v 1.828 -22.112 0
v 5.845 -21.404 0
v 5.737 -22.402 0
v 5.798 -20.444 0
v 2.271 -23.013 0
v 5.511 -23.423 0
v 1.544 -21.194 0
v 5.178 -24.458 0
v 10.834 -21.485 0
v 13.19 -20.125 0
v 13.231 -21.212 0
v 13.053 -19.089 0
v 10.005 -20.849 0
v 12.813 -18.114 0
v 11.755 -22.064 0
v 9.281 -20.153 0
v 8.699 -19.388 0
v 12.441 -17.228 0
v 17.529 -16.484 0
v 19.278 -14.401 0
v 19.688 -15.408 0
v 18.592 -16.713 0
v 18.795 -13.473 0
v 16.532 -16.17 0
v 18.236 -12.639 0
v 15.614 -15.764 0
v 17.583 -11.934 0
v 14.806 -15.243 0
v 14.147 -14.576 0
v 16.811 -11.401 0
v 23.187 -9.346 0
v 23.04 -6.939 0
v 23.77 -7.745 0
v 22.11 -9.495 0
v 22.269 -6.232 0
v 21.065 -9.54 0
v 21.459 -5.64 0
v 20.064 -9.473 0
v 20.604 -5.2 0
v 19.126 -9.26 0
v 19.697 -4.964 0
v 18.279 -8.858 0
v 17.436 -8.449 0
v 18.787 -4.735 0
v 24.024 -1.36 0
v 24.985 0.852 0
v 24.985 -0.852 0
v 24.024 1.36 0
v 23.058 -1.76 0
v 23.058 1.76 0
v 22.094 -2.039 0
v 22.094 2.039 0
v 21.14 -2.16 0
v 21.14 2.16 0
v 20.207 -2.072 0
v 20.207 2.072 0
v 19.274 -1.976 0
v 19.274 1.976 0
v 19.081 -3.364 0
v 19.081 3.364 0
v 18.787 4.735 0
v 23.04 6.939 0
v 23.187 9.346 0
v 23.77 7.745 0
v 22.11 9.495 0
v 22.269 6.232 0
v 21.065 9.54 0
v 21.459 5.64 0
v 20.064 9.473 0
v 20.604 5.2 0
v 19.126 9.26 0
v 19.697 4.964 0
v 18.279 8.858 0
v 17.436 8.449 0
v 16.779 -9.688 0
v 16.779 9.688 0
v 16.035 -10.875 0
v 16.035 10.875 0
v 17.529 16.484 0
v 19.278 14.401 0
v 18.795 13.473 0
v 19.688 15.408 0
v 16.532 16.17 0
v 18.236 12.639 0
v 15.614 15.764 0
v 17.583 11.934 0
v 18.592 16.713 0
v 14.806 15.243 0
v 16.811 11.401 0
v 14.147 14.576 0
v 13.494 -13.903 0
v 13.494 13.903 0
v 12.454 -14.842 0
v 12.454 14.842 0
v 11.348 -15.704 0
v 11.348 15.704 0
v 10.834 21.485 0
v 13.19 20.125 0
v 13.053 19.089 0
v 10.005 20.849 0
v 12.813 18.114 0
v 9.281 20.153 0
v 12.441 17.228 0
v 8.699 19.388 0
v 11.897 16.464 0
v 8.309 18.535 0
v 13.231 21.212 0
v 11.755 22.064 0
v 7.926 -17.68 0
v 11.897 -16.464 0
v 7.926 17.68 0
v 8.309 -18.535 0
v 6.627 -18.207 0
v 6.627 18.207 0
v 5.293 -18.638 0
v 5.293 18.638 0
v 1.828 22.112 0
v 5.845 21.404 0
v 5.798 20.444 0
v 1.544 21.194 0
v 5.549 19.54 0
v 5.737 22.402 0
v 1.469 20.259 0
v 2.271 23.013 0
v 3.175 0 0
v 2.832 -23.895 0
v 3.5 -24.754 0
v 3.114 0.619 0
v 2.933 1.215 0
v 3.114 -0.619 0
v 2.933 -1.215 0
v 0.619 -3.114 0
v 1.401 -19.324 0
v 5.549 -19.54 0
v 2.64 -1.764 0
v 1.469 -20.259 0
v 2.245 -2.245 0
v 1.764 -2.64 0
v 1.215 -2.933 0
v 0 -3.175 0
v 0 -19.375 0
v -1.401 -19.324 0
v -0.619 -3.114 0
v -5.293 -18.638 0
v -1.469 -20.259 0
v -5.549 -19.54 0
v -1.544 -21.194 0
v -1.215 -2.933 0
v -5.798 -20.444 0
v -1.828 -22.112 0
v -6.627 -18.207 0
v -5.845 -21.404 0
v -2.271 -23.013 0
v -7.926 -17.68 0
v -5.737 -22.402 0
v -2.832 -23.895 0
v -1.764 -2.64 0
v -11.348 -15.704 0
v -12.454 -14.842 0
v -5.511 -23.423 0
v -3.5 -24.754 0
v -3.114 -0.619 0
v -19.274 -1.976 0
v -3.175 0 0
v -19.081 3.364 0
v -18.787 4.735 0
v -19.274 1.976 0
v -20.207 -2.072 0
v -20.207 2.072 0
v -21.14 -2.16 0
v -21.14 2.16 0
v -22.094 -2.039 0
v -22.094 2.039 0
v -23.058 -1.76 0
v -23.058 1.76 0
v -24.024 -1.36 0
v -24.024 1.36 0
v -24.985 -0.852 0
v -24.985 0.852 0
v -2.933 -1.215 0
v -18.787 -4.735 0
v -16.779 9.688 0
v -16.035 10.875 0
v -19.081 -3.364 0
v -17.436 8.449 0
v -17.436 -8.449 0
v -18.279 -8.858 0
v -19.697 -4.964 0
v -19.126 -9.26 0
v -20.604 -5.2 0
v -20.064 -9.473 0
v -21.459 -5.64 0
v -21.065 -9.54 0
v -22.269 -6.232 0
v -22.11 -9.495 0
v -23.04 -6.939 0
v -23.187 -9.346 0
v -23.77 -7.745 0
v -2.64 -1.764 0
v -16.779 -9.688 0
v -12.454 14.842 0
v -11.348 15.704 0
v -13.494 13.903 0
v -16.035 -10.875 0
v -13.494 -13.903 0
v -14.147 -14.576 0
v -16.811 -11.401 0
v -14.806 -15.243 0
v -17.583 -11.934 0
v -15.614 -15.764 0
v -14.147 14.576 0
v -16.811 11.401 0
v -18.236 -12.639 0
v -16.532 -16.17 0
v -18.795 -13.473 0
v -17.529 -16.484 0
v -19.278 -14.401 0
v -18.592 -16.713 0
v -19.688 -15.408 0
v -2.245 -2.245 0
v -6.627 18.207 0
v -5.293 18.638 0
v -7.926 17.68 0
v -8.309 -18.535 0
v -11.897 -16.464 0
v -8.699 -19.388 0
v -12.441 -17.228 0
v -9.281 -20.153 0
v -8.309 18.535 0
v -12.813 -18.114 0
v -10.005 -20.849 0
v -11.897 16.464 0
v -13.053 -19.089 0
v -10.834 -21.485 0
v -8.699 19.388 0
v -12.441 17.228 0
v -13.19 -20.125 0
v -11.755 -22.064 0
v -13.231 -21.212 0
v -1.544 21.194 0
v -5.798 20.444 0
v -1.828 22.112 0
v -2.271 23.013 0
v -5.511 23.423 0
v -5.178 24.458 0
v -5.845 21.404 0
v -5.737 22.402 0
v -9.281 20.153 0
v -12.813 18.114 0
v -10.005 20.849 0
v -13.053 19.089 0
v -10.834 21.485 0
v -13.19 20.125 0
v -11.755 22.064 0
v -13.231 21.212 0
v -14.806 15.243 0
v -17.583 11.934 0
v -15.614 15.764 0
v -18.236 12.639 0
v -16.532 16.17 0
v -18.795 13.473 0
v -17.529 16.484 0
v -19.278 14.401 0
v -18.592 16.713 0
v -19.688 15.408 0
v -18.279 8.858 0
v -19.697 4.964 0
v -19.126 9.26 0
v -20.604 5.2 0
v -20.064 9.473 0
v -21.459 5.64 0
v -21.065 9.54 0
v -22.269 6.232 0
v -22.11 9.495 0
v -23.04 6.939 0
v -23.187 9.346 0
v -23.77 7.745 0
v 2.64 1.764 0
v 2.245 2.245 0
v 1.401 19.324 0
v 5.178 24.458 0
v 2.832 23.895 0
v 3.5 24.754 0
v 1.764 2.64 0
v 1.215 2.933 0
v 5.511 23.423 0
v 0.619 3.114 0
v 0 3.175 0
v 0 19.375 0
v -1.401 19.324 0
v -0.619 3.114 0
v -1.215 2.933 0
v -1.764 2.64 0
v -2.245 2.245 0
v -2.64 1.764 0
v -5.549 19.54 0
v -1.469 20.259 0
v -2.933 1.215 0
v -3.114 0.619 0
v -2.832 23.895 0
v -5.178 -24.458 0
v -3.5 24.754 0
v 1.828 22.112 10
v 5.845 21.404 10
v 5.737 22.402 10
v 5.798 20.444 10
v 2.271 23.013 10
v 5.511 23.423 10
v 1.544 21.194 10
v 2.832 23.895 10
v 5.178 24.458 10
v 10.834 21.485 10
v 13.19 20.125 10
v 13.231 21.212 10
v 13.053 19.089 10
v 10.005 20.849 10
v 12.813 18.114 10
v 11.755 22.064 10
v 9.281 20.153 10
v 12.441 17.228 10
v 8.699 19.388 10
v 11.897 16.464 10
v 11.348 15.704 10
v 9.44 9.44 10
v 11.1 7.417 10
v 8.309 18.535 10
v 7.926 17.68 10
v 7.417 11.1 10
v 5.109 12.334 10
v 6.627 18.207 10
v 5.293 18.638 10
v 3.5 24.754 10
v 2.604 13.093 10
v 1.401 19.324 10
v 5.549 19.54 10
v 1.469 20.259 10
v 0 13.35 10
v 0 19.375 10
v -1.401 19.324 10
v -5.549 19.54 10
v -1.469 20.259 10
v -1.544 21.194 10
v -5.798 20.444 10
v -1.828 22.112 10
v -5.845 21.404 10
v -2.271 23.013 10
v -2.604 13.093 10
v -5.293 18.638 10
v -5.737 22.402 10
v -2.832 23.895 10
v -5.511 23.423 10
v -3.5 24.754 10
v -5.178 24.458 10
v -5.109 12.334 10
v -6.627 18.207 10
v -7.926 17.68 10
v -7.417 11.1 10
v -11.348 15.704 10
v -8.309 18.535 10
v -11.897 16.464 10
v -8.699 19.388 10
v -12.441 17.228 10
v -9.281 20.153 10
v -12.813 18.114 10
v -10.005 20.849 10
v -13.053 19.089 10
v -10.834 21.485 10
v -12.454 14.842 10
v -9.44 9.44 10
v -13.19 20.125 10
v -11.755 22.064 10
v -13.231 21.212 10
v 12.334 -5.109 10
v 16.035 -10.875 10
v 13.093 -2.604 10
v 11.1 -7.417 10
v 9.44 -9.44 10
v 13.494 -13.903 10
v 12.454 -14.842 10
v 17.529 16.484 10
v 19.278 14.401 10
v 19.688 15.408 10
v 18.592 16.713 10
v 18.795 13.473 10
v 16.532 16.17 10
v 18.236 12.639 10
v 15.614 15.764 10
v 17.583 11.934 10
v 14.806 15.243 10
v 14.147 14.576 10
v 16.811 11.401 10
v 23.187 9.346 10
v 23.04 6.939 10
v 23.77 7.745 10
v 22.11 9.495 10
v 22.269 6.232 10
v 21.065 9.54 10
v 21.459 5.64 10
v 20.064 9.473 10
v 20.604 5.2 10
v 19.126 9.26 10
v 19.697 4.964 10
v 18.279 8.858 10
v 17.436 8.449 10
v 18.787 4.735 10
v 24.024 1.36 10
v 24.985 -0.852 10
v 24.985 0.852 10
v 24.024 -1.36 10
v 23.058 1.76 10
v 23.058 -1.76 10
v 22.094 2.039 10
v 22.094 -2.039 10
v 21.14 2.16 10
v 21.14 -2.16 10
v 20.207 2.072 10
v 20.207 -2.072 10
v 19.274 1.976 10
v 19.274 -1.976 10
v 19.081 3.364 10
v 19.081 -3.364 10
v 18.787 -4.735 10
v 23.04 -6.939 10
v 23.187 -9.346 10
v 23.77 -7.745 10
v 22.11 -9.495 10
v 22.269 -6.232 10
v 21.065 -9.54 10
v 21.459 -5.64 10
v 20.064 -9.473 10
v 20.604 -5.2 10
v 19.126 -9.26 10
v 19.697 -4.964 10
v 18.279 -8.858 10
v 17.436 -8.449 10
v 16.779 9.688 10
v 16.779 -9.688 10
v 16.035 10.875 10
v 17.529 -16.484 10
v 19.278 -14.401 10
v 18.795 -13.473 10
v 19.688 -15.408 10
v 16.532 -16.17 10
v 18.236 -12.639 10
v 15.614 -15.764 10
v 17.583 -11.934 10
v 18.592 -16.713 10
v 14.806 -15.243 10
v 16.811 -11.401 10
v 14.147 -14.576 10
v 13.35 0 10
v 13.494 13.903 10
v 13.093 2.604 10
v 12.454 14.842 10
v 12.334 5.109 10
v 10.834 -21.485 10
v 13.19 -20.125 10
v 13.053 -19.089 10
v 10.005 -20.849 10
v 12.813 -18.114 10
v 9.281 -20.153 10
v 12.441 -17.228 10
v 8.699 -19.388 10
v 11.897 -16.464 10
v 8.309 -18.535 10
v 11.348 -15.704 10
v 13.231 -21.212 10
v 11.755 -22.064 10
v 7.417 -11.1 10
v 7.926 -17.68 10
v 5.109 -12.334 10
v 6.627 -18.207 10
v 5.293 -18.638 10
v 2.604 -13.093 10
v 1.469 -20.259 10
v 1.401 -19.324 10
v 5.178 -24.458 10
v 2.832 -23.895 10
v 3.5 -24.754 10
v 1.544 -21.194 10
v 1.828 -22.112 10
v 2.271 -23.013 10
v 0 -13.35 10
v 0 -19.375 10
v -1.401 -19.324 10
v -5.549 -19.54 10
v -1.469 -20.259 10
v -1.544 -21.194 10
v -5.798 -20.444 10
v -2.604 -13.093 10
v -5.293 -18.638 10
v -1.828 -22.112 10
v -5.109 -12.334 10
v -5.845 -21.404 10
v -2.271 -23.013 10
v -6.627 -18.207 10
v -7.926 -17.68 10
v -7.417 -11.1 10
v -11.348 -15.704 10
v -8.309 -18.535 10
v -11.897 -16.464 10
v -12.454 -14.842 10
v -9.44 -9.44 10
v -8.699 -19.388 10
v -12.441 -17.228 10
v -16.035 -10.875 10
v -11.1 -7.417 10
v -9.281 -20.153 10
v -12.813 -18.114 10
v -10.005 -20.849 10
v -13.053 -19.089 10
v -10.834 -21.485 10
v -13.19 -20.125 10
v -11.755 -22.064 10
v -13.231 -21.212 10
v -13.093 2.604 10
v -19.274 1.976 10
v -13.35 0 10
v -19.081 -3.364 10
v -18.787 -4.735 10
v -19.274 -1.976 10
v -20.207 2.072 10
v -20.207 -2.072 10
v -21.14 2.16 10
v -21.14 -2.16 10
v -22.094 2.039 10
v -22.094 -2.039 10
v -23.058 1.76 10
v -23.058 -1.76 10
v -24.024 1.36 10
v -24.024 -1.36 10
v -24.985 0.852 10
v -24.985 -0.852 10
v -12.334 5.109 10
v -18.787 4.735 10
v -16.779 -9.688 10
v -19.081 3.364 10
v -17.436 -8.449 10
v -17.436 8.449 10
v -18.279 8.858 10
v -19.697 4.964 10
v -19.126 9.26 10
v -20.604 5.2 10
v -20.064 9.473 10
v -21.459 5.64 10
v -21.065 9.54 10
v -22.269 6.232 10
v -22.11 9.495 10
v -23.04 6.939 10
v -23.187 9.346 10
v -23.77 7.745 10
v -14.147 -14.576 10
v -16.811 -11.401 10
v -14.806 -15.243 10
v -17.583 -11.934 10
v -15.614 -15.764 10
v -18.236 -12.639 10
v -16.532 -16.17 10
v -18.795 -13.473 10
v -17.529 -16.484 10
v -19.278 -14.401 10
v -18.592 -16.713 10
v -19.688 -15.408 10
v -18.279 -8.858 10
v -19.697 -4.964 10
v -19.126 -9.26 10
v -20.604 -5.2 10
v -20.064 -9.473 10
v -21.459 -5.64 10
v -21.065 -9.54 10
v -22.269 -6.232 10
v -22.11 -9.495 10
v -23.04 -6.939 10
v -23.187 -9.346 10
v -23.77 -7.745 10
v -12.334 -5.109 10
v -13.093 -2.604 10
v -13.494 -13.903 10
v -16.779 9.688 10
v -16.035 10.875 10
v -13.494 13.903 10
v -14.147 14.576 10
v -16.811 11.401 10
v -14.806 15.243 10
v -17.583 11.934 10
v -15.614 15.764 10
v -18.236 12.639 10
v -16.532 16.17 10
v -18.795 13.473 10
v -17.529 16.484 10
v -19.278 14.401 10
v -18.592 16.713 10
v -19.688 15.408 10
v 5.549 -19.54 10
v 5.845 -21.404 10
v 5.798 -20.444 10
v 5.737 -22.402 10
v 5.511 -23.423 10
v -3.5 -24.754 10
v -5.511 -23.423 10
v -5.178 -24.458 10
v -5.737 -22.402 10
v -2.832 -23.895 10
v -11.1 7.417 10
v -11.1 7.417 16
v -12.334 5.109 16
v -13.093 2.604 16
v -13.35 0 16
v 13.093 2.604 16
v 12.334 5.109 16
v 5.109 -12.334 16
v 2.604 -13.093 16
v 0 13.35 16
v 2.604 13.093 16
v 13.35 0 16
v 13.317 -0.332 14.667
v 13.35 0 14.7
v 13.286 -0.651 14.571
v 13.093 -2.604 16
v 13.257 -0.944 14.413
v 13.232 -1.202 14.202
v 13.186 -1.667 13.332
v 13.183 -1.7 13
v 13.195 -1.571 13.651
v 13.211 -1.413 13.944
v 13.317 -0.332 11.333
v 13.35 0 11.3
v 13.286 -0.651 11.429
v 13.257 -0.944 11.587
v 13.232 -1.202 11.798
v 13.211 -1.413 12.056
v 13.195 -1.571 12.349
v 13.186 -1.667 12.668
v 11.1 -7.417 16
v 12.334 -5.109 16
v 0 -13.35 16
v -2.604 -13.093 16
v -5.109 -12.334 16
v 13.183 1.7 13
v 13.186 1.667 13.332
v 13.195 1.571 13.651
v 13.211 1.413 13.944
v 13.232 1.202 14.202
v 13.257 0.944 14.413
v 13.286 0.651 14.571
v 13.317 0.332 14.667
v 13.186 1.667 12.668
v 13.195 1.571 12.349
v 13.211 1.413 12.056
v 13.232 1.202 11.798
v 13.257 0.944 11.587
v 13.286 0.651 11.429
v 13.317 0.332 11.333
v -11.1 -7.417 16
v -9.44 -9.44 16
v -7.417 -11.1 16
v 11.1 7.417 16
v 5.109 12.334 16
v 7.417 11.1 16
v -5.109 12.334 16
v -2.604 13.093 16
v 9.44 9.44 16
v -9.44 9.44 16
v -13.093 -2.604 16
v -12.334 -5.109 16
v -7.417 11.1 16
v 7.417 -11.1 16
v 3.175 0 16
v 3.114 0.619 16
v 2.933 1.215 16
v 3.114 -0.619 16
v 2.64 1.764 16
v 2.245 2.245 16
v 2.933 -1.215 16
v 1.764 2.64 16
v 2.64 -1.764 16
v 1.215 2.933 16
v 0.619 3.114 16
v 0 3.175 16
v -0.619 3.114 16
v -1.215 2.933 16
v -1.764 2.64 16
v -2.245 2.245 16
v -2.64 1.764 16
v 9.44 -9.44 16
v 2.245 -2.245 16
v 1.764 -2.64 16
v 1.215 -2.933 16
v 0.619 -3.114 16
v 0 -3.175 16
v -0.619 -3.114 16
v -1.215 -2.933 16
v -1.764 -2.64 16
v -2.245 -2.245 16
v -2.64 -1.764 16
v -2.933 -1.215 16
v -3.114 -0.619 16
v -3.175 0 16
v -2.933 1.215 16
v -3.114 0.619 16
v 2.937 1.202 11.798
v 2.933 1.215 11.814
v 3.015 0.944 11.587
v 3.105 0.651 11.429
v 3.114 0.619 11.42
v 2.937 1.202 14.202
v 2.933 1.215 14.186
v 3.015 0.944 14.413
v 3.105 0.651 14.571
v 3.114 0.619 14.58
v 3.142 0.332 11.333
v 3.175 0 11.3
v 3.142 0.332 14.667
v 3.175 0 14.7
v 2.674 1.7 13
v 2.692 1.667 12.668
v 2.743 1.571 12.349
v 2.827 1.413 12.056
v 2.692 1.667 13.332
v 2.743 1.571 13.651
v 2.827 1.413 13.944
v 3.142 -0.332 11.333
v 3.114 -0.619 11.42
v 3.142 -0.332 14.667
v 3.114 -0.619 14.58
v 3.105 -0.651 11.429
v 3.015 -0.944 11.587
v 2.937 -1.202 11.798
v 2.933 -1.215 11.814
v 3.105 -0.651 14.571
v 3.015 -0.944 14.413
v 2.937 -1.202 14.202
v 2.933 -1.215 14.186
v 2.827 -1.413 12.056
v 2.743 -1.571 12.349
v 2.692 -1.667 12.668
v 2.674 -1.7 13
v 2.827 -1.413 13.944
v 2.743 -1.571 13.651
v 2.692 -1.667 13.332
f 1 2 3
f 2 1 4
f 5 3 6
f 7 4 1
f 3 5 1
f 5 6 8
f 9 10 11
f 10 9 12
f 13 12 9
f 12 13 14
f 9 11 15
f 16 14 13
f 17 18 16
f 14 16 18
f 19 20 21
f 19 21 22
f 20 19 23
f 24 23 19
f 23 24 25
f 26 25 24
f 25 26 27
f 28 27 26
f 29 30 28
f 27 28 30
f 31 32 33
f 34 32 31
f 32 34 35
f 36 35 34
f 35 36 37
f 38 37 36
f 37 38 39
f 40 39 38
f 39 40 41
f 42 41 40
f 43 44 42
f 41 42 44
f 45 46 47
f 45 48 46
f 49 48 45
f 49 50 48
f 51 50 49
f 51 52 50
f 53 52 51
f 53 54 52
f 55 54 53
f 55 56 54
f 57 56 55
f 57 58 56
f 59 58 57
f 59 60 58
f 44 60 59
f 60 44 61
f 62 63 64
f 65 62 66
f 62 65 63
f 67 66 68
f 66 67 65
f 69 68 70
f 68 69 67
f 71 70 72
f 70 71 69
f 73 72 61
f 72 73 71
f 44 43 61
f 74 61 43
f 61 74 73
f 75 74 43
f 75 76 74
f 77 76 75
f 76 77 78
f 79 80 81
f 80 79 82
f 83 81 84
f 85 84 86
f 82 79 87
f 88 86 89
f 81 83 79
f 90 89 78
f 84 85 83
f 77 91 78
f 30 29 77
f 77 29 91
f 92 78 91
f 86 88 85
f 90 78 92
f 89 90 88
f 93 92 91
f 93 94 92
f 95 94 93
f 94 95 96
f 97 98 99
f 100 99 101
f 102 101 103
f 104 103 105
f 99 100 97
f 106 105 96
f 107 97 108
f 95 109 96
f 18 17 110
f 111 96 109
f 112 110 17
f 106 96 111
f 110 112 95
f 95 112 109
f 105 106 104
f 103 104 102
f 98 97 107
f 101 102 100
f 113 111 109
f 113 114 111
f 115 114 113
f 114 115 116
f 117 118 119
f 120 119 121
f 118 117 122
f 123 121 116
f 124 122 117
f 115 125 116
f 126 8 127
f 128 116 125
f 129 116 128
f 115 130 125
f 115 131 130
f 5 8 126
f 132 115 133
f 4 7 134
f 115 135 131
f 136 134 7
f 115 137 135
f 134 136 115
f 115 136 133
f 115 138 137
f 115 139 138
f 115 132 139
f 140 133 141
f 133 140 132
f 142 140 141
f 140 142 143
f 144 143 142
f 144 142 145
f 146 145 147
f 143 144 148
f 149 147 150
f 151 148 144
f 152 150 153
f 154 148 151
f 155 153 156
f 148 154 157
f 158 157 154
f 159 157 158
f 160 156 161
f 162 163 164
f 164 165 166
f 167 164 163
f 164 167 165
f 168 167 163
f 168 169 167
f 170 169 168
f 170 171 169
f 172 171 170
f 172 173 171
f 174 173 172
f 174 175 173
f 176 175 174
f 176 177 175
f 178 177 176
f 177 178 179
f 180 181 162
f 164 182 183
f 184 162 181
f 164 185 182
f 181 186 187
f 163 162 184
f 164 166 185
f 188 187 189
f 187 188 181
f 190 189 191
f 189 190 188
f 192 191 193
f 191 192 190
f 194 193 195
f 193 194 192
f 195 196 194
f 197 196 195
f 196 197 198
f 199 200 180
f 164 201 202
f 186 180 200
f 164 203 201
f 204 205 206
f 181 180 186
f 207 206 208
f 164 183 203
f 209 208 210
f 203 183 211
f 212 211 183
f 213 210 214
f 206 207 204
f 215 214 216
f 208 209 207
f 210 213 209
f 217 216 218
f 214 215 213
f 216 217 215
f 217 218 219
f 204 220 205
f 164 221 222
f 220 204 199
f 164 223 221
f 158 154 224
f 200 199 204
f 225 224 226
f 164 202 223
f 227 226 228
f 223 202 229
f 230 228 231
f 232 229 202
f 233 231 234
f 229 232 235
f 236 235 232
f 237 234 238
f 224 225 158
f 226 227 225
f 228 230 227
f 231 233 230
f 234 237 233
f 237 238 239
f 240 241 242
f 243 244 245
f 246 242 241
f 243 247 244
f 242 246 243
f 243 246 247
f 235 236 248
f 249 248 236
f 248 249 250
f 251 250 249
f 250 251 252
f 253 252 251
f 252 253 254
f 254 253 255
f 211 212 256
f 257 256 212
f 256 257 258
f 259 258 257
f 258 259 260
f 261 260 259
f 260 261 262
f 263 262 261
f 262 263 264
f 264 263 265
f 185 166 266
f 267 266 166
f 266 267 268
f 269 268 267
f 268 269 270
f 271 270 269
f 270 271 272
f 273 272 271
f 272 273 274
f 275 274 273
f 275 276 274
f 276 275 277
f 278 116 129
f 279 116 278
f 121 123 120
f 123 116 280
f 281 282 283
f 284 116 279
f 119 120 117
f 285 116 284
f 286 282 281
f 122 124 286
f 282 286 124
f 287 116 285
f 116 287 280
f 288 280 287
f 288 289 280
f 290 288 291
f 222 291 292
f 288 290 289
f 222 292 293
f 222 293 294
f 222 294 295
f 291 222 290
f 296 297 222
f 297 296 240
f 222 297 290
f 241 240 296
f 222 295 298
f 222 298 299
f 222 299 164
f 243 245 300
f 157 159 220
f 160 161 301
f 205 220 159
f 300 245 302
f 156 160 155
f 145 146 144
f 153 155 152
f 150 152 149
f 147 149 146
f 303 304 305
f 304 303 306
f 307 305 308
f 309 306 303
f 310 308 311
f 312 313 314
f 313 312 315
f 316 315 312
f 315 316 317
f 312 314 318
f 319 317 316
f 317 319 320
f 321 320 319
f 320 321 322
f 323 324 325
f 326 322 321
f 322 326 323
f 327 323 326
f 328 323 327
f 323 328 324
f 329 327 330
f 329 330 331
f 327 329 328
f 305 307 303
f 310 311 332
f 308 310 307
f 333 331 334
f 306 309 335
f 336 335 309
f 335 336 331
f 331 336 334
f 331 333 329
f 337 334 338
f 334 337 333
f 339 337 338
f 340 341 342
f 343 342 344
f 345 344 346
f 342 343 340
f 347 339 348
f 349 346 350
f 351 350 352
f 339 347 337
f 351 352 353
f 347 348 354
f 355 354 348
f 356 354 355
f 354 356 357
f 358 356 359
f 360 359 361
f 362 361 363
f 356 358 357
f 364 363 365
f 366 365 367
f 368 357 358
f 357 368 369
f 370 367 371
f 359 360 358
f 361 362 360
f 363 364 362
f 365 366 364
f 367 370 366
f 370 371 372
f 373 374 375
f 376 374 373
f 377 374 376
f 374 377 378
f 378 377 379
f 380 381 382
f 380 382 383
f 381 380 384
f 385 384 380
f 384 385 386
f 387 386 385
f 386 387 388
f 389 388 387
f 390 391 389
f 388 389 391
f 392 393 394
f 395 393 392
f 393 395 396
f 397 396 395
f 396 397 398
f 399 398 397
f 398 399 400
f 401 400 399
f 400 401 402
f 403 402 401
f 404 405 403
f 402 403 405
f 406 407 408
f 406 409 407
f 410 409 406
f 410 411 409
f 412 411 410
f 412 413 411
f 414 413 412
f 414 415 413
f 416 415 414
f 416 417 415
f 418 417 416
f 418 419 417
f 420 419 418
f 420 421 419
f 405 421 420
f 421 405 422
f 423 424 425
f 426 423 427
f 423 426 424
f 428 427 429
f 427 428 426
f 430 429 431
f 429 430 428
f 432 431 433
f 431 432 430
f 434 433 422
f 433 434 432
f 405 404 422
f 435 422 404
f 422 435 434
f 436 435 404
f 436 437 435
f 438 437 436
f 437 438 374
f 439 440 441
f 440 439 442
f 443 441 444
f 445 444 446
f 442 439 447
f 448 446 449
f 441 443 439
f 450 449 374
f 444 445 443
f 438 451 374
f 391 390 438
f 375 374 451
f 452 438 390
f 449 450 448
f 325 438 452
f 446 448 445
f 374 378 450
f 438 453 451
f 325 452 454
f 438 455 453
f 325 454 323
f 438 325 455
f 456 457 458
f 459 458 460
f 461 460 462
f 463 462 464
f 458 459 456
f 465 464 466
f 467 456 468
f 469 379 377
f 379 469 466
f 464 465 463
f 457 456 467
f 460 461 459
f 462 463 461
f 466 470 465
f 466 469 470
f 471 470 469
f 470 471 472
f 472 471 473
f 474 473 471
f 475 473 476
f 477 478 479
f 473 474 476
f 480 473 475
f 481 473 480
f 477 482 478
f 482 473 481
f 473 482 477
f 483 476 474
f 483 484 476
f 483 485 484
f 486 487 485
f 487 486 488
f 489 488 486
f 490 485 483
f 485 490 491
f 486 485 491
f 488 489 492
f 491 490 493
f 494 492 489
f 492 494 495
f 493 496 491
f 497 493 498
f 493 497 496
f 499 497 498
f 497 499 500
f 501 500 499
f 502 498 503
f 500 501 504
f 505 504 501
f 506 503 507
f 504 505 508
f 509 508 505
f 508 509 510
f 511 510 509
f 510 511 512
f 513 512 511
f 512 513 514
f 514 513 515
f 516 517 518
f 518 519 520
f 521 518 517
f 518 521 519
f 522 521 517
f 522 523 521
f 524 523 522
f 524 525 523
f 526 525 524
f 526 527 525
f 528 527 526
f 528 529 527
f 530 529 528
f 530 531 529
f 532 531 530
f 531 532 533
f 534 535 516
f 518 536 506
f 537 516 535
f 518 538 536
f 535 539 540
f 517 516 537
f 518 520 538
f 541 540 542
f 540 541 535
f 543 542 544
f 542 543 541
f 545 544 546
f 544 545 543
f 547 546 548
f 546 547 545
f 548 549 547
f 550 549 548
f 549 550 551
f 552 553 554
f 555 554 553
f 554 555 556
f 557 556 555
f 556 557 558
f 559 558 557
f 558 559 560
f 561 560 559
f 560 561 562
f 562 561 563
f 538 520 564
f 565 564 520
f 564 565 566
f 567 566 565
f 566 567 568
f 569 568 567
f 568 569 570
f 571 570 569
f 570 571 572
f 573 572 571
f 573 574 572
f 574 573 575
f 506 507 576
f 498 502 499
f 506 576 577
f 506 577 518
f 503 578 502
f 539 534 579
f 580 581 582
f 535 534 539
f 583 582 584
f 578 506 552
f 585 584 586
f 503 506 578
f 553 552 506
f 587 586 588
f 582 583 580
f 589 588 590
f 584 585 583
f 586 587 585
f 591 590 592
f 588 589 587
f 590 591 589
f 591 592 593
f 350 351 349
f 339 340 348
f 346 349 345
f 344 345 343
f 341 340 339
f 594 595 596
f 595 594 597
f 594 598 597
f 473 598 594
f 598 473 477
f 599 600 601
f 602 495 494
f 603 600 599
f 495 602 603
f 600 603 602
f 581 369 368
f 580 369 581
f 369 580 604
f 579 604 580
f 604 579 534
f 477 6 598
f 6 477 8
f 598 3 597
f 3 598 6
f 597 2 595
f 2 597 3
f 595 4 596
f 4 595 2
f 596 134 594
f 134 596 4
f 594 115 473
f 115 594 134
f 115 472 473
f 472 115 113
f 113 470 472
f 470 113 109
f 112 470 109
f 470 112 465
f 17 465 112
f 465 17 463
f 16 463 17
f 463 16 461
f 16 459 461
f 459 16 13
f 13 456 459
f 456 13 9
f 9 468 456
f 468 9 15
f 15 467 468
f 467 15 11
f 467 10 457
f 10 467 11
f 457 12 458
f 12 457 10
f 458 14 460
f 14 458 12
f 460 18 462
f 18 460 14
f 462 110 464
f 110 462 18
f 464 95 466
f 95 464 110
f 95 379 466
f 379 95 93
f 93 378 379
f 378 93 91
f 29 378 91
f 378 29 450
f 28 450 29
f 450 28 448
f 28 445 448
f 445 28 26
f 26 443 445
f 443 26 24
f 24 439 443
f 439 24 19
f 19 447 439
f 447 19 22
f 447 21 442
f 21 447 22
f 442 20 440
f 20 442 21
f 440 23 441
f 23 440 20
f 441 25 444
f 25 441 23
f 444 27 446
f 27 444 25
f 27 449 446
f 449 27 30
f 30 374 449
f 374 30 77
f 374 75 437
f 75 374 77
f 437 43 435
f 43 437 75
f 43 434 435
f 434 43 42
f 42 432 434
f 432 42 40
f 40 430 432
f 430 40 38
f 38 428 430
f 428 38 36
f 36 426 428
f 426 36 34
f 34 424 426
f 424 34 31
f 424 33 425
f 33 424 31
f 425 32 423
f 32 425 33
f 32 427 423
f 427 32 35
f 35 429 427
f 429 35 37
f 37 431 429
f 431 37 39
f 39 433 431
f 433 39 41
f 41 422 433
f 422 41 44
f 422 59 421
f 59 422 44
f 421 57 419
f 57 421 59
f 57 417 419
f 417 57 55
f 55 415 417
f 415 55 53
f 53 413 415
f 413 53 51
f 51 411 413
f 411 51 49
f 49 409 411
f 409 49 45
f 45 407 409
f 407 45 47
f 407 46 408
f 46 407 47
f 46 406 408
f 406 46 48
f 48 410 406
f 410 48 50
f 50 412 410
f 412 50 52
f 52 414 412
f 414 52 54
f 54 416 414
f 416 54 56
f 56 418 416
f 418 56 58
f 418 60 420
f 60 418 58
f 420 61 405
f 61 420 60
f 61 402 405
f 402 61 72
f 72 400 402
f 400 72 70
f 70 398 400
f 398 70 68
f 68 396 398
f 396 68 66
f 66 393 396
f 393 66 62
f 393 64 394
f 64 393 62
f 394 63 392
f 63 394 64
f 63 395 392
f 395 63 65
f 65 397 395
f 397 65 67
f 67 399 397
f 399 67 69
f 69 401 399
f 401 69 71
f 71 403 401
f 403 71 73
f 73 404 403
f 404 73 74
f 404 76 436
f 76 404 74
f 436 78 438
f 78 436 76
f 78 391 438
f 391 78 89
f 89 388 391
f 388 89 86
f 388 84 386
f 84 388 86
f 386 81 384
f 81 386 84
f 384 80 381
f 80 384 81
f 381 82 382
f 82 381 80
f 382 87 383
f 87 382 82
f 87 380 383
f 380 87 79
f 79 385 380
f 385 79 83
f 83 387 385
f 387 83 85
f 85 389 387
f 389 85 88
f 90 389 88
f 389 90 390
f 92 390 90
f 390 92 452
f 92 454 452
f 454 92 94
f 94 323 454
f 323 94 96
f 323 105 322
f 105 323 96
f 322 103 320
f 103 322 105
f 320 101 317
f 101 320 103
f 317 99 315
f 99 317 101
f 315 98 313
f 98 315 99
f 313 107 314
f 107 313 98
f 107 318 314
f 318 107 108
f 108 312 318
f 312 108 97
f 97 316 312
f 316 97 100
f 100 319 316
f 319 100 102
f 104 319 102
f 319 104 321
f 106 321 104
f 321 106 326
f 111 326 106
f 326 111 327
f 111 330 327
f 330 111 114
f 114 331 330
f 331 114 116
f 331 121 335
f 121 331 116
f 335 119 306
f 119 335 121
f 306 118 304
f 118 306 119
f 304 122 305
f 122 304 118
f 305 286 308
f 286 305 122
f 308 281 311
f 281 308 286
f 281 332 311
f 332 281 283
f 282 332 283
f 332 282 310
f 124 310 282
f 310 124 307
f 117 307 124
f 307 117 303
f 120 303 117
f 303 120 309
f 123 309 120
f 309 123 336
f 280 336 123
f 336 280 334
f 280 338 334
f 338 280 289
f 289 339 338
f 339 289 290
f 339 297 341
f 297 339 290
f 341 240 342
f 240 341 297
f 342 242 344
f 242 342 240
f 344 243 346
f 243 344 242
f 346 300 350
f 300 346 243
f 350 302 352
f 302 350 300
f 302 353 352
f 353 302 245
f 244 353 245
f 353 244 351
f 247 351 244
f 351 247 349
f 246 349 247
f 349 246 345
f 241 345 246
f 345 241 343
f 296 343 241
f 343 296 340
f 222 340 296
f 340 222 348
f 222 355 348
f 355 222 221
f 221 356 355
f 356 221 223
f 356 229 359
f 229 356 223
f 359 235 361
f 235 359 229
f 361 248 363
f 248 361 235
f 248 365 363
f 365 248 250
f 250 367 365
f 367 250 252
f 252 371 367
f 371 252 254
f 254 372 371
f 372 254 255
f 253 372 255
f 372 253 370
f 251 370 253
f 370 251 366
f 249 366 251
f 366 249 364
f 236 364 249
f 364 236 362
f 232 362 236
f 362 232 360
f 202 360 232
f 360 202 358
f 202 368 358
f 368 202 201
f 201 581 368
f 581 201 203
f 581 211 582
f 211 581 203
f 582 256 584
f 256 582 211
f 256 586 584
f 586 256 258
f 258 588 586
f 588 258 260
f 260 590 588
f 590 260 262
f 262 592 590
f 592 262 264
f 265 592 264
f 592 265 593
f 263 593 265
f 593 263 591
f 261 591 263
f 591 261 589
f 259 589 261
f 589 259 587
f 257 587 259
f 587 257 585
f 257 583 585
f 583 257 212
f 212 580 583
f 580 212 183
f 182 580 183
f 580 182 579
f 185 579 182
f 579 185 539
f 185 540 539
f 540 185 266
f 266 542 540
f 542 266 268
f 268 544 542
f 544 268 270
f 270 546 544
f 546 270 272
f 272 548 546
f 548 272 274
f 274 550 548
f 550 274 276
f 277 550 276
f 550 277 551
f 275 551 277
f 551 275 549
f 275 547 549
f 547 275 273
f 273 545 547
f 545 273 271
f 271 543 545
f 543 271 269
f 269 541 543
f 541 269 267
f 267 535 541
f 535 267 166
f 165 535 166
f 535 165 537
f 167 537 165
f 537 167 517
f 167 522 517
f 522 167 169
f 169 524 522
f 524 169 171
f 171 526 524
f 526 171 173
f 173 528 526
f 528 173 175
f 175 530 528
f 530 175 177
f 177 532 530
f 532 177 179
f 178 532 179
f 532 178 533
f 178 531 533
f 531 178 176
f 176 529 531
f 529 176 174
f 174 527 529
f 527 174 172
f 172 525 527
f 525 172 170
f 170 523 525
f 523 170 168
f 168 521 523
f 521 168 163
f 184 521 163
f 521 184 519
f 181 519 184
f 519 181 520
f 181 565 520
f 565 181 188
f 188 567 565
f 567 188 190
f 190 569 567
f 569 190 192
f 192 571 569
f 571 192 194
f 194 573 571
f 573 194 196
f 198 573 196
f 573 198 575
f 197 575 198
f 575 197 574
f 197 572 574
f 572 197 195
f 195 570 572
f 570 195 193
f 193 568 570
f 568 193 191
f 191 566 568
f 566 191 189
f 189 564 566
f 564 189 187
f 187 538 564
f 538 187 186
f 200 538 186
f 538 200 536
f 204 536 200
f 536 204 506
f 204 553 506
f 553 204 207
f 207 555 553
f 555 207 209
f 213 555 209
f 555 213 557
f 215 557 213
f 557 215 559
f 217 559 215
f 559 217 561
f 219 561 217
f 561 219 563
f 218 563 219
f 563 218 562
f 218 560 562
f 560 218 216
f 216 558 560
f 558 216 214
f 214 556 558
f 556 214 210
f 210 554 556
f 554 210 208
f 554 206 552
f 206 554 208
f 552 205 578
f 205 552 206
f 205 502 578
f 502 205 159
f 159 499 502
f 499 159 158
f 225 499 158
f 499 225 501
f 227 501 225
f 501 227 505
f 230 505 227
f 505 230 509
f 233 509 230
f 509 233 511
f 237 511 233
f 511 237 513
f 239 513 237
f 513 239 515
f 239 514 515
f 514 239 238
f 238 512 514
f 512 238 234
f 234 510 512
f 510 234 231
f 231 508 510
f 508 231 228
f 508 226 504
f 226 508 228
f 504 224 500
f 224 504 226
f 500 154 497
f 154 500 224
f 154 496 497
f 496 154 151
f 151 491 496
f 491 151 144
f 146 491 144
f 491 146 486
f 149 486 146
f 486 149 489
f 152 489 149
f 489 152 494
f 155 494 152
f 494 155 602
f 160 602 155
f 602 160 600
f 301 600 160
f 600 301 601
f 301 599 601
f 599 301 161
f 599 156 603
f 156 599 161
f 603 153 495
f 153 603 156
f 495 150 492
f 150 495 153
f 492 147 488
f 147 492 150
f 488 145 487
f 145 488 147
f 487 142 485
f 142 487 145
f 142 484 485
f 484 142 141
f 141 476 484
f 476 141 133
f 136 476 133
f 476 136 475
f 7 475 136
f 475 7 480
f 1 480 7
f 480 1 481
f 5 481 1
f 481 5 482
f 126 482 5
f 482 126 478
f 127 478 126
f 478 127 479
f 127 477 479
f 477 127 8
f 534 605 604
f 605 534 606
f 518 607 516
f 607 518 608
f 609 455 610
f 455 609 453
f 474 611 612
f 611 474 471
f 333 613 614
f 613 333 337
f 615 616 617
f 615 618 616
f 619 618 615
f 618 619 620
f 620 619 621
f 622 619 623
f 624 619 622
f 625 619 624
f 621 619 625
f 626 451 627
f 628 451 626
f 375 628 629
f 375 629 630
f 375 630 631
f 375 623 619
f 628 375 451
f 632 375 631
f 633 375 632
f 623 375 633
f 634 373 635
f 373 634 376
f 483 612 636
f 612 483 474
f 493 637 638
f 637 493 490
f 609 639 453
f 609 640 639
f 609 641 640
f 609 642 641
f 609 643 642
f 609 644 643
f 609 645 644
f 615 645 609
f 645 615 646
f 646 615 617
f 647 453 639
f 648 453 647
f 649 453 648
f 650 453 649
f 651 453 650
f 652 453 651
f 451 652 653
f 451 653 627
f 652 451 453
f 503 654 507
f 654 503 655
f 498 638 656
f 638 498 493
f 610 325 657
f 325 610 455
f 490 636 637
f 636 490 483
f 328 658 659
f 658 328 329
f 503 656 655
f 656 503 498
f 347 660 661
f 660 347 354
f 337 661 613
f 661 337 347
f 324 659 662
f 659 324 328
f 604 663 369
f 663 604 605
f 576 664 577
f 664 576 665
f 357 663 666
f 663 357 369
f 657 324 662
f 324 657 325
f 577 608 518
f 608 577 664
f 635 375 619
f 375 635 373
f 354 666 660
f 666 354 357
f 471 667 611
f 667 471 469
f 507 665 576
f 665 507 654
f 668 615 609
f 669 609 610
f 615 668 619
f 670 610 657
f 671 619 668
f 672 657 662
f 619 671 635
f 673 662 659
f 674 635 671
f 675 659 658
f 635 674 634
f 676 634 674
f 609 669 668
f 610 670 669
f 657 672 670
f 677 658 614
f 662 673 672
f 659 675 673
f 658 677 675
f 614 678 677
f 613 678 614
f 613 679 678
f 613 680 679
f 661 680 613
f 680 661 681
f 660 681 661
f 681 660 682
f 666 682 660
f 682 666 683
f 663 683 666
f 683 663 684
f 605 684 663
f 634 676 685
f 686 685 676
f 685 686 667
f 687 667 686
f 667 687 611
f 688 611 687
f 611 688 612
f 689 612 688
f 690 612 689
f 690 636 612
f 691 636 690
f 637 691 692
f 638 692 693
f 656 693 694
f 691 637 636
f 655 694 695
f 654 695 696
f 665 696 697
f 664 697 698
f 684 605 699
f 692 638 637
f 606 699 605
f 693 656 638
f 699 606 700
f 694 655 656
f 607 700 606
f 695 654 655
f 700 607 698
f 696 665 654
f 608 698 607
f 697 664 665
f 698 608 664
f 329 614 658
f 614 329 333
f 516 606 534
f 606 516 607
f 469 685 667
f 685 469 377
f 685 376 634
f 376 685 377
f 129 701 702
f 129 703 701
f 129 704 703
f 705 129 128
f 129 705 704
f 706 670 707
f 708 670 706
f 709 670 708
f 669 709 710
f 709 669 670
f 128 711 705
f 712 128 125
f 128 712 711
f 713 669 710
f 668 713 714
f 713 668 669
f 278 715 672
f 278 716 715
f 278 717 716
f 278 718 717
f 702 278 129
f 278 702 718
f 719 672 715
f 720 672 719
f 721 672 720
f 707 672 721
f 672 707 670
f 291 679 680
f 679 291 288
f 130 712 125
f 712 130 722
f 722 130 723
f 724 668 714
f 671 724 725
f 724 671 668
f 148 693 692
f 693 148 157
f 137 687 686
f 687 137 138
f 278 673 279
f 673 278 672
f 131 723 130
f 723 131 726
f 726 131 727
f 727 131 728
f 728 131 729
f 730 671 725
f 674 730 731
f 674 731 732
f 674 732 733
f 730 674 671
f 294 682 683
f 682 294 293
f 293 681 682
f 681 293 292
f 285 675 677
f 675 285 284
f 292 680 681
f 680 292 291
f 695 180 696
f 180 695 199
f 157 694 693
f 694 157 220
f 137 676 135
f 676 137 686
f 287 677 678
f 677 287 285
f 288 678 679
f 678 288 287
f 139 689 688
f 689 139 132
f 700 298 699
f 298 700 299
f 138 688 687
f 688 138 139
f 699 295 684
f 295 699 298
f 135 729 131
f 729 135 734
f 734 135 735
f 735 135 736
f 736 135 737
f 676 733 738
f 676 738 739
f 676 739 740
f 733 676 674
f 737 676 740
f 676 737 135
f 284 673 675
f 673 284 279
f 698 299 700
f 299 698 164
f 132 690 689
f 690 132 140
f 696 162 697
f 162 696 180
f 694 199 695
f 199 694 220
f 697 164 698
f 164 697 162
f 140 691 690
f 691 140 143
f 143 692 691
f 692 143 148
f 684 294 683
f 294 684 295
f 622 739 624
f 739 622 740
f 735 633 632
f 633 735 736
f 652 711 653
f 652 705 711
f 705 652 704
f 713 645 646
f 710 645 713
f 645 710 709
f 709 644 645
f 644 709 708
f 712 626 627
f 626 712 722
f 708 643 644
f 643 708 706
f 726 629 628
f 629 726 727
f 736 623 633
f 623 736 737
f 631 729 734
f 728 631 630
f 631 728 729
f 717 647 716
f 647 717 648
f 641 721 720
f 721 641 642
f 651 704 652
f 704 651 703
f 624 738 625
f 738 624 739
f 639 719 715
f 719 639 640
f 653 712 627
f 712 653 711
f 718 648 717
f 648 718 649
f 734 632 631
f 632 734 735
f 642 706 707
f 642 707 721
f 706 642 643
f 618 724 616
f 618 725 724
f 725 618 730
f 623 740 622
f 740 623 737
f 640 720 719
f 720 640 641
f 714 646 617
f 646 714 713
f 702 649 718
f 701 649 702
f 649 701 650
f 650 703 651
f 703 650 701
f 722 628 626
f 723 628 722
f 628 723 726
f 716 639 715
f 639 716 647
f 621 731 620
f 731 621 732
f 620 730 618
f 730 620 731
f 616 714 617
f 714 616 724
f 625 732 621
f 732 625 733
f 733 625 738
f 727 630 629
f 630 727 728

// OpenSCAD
$fn = 32;

// ----------------------------------------------------------------------
// Spur gear: m=2.5 z=18, 50 mm tip diameter x 16 mm
// ----------------------------------------------------------------------

// --- parameters (mm) ---
modul = 2.5;              // module
n_teeth = 18;             // number of teeth
width = 10;               // face width
pa = 20;                  // pressure angle, deg
shaft_d = 6.35;           // shaft bore
boss_d = 26.7;            // hub diameter
boss_h = 6;               // hub above the face
set_d = 3.4;              // set screw tap hole
set_z = 13;               // set screw height

/* --- involute profile --- */
pitch_r = modul * n_teeth / 2;
base_r = pitch_r * cos(pa);
tip_r = pitch_r + modul;
root_r = pitch_r - 1.25 * modul;
flank_steps = 6;

function inv_deg(a) = (tan(a) - a * PI / 180) * 180 / PI;
function flank_r(i) = root_r + (tip_r - root_r) * i / flank_steps;
function half_angle(r) = 90 / n_teeth + inv_deg(pa) - inv_deg(acos(min(1, base_r / r)));
function tooth_pt(k, i, side) =
    let (r = flank_r(i), a = k * 360 / n_teeth + side * half_angle(r))
    [r * cos(a), r * sin(a)];

module tooth_profile() {
  polygon(points = [
    for (k = [0 : n_teeth - 1])
      each [
        for (i = [0 : flank_steps]) tooth_pt(k, i, -1),
        for (i = [flank_steps : -1 : 0]) tooth_pt(k, i, 1),
        let (ta = (k + 0.5) * 360 / n_teeth)
          [root_r * cos(ta), root_r * sin(ta)]
      ]
  ]);
}

module gear_disc() {
  linear_extrude(height = width) tooth_profile();
}

module hub_boss() {
  translate([0, 0, width - 1]) cylinder(h = boss_h + 1, d = boss_d);
}

difference() {
  union() {
    gear_disc();
    hub_boss();
  }
  translate([0, 0, -1]) cylinder(h = width + boss_h + 3, d = shaft_d);
  /* set screw, drilled radially */
  translate([-1, 0, set_z]) rotate([0, 90, 0]) cylinder(h = boss_d / 2 + 3, d = set_d);
}
